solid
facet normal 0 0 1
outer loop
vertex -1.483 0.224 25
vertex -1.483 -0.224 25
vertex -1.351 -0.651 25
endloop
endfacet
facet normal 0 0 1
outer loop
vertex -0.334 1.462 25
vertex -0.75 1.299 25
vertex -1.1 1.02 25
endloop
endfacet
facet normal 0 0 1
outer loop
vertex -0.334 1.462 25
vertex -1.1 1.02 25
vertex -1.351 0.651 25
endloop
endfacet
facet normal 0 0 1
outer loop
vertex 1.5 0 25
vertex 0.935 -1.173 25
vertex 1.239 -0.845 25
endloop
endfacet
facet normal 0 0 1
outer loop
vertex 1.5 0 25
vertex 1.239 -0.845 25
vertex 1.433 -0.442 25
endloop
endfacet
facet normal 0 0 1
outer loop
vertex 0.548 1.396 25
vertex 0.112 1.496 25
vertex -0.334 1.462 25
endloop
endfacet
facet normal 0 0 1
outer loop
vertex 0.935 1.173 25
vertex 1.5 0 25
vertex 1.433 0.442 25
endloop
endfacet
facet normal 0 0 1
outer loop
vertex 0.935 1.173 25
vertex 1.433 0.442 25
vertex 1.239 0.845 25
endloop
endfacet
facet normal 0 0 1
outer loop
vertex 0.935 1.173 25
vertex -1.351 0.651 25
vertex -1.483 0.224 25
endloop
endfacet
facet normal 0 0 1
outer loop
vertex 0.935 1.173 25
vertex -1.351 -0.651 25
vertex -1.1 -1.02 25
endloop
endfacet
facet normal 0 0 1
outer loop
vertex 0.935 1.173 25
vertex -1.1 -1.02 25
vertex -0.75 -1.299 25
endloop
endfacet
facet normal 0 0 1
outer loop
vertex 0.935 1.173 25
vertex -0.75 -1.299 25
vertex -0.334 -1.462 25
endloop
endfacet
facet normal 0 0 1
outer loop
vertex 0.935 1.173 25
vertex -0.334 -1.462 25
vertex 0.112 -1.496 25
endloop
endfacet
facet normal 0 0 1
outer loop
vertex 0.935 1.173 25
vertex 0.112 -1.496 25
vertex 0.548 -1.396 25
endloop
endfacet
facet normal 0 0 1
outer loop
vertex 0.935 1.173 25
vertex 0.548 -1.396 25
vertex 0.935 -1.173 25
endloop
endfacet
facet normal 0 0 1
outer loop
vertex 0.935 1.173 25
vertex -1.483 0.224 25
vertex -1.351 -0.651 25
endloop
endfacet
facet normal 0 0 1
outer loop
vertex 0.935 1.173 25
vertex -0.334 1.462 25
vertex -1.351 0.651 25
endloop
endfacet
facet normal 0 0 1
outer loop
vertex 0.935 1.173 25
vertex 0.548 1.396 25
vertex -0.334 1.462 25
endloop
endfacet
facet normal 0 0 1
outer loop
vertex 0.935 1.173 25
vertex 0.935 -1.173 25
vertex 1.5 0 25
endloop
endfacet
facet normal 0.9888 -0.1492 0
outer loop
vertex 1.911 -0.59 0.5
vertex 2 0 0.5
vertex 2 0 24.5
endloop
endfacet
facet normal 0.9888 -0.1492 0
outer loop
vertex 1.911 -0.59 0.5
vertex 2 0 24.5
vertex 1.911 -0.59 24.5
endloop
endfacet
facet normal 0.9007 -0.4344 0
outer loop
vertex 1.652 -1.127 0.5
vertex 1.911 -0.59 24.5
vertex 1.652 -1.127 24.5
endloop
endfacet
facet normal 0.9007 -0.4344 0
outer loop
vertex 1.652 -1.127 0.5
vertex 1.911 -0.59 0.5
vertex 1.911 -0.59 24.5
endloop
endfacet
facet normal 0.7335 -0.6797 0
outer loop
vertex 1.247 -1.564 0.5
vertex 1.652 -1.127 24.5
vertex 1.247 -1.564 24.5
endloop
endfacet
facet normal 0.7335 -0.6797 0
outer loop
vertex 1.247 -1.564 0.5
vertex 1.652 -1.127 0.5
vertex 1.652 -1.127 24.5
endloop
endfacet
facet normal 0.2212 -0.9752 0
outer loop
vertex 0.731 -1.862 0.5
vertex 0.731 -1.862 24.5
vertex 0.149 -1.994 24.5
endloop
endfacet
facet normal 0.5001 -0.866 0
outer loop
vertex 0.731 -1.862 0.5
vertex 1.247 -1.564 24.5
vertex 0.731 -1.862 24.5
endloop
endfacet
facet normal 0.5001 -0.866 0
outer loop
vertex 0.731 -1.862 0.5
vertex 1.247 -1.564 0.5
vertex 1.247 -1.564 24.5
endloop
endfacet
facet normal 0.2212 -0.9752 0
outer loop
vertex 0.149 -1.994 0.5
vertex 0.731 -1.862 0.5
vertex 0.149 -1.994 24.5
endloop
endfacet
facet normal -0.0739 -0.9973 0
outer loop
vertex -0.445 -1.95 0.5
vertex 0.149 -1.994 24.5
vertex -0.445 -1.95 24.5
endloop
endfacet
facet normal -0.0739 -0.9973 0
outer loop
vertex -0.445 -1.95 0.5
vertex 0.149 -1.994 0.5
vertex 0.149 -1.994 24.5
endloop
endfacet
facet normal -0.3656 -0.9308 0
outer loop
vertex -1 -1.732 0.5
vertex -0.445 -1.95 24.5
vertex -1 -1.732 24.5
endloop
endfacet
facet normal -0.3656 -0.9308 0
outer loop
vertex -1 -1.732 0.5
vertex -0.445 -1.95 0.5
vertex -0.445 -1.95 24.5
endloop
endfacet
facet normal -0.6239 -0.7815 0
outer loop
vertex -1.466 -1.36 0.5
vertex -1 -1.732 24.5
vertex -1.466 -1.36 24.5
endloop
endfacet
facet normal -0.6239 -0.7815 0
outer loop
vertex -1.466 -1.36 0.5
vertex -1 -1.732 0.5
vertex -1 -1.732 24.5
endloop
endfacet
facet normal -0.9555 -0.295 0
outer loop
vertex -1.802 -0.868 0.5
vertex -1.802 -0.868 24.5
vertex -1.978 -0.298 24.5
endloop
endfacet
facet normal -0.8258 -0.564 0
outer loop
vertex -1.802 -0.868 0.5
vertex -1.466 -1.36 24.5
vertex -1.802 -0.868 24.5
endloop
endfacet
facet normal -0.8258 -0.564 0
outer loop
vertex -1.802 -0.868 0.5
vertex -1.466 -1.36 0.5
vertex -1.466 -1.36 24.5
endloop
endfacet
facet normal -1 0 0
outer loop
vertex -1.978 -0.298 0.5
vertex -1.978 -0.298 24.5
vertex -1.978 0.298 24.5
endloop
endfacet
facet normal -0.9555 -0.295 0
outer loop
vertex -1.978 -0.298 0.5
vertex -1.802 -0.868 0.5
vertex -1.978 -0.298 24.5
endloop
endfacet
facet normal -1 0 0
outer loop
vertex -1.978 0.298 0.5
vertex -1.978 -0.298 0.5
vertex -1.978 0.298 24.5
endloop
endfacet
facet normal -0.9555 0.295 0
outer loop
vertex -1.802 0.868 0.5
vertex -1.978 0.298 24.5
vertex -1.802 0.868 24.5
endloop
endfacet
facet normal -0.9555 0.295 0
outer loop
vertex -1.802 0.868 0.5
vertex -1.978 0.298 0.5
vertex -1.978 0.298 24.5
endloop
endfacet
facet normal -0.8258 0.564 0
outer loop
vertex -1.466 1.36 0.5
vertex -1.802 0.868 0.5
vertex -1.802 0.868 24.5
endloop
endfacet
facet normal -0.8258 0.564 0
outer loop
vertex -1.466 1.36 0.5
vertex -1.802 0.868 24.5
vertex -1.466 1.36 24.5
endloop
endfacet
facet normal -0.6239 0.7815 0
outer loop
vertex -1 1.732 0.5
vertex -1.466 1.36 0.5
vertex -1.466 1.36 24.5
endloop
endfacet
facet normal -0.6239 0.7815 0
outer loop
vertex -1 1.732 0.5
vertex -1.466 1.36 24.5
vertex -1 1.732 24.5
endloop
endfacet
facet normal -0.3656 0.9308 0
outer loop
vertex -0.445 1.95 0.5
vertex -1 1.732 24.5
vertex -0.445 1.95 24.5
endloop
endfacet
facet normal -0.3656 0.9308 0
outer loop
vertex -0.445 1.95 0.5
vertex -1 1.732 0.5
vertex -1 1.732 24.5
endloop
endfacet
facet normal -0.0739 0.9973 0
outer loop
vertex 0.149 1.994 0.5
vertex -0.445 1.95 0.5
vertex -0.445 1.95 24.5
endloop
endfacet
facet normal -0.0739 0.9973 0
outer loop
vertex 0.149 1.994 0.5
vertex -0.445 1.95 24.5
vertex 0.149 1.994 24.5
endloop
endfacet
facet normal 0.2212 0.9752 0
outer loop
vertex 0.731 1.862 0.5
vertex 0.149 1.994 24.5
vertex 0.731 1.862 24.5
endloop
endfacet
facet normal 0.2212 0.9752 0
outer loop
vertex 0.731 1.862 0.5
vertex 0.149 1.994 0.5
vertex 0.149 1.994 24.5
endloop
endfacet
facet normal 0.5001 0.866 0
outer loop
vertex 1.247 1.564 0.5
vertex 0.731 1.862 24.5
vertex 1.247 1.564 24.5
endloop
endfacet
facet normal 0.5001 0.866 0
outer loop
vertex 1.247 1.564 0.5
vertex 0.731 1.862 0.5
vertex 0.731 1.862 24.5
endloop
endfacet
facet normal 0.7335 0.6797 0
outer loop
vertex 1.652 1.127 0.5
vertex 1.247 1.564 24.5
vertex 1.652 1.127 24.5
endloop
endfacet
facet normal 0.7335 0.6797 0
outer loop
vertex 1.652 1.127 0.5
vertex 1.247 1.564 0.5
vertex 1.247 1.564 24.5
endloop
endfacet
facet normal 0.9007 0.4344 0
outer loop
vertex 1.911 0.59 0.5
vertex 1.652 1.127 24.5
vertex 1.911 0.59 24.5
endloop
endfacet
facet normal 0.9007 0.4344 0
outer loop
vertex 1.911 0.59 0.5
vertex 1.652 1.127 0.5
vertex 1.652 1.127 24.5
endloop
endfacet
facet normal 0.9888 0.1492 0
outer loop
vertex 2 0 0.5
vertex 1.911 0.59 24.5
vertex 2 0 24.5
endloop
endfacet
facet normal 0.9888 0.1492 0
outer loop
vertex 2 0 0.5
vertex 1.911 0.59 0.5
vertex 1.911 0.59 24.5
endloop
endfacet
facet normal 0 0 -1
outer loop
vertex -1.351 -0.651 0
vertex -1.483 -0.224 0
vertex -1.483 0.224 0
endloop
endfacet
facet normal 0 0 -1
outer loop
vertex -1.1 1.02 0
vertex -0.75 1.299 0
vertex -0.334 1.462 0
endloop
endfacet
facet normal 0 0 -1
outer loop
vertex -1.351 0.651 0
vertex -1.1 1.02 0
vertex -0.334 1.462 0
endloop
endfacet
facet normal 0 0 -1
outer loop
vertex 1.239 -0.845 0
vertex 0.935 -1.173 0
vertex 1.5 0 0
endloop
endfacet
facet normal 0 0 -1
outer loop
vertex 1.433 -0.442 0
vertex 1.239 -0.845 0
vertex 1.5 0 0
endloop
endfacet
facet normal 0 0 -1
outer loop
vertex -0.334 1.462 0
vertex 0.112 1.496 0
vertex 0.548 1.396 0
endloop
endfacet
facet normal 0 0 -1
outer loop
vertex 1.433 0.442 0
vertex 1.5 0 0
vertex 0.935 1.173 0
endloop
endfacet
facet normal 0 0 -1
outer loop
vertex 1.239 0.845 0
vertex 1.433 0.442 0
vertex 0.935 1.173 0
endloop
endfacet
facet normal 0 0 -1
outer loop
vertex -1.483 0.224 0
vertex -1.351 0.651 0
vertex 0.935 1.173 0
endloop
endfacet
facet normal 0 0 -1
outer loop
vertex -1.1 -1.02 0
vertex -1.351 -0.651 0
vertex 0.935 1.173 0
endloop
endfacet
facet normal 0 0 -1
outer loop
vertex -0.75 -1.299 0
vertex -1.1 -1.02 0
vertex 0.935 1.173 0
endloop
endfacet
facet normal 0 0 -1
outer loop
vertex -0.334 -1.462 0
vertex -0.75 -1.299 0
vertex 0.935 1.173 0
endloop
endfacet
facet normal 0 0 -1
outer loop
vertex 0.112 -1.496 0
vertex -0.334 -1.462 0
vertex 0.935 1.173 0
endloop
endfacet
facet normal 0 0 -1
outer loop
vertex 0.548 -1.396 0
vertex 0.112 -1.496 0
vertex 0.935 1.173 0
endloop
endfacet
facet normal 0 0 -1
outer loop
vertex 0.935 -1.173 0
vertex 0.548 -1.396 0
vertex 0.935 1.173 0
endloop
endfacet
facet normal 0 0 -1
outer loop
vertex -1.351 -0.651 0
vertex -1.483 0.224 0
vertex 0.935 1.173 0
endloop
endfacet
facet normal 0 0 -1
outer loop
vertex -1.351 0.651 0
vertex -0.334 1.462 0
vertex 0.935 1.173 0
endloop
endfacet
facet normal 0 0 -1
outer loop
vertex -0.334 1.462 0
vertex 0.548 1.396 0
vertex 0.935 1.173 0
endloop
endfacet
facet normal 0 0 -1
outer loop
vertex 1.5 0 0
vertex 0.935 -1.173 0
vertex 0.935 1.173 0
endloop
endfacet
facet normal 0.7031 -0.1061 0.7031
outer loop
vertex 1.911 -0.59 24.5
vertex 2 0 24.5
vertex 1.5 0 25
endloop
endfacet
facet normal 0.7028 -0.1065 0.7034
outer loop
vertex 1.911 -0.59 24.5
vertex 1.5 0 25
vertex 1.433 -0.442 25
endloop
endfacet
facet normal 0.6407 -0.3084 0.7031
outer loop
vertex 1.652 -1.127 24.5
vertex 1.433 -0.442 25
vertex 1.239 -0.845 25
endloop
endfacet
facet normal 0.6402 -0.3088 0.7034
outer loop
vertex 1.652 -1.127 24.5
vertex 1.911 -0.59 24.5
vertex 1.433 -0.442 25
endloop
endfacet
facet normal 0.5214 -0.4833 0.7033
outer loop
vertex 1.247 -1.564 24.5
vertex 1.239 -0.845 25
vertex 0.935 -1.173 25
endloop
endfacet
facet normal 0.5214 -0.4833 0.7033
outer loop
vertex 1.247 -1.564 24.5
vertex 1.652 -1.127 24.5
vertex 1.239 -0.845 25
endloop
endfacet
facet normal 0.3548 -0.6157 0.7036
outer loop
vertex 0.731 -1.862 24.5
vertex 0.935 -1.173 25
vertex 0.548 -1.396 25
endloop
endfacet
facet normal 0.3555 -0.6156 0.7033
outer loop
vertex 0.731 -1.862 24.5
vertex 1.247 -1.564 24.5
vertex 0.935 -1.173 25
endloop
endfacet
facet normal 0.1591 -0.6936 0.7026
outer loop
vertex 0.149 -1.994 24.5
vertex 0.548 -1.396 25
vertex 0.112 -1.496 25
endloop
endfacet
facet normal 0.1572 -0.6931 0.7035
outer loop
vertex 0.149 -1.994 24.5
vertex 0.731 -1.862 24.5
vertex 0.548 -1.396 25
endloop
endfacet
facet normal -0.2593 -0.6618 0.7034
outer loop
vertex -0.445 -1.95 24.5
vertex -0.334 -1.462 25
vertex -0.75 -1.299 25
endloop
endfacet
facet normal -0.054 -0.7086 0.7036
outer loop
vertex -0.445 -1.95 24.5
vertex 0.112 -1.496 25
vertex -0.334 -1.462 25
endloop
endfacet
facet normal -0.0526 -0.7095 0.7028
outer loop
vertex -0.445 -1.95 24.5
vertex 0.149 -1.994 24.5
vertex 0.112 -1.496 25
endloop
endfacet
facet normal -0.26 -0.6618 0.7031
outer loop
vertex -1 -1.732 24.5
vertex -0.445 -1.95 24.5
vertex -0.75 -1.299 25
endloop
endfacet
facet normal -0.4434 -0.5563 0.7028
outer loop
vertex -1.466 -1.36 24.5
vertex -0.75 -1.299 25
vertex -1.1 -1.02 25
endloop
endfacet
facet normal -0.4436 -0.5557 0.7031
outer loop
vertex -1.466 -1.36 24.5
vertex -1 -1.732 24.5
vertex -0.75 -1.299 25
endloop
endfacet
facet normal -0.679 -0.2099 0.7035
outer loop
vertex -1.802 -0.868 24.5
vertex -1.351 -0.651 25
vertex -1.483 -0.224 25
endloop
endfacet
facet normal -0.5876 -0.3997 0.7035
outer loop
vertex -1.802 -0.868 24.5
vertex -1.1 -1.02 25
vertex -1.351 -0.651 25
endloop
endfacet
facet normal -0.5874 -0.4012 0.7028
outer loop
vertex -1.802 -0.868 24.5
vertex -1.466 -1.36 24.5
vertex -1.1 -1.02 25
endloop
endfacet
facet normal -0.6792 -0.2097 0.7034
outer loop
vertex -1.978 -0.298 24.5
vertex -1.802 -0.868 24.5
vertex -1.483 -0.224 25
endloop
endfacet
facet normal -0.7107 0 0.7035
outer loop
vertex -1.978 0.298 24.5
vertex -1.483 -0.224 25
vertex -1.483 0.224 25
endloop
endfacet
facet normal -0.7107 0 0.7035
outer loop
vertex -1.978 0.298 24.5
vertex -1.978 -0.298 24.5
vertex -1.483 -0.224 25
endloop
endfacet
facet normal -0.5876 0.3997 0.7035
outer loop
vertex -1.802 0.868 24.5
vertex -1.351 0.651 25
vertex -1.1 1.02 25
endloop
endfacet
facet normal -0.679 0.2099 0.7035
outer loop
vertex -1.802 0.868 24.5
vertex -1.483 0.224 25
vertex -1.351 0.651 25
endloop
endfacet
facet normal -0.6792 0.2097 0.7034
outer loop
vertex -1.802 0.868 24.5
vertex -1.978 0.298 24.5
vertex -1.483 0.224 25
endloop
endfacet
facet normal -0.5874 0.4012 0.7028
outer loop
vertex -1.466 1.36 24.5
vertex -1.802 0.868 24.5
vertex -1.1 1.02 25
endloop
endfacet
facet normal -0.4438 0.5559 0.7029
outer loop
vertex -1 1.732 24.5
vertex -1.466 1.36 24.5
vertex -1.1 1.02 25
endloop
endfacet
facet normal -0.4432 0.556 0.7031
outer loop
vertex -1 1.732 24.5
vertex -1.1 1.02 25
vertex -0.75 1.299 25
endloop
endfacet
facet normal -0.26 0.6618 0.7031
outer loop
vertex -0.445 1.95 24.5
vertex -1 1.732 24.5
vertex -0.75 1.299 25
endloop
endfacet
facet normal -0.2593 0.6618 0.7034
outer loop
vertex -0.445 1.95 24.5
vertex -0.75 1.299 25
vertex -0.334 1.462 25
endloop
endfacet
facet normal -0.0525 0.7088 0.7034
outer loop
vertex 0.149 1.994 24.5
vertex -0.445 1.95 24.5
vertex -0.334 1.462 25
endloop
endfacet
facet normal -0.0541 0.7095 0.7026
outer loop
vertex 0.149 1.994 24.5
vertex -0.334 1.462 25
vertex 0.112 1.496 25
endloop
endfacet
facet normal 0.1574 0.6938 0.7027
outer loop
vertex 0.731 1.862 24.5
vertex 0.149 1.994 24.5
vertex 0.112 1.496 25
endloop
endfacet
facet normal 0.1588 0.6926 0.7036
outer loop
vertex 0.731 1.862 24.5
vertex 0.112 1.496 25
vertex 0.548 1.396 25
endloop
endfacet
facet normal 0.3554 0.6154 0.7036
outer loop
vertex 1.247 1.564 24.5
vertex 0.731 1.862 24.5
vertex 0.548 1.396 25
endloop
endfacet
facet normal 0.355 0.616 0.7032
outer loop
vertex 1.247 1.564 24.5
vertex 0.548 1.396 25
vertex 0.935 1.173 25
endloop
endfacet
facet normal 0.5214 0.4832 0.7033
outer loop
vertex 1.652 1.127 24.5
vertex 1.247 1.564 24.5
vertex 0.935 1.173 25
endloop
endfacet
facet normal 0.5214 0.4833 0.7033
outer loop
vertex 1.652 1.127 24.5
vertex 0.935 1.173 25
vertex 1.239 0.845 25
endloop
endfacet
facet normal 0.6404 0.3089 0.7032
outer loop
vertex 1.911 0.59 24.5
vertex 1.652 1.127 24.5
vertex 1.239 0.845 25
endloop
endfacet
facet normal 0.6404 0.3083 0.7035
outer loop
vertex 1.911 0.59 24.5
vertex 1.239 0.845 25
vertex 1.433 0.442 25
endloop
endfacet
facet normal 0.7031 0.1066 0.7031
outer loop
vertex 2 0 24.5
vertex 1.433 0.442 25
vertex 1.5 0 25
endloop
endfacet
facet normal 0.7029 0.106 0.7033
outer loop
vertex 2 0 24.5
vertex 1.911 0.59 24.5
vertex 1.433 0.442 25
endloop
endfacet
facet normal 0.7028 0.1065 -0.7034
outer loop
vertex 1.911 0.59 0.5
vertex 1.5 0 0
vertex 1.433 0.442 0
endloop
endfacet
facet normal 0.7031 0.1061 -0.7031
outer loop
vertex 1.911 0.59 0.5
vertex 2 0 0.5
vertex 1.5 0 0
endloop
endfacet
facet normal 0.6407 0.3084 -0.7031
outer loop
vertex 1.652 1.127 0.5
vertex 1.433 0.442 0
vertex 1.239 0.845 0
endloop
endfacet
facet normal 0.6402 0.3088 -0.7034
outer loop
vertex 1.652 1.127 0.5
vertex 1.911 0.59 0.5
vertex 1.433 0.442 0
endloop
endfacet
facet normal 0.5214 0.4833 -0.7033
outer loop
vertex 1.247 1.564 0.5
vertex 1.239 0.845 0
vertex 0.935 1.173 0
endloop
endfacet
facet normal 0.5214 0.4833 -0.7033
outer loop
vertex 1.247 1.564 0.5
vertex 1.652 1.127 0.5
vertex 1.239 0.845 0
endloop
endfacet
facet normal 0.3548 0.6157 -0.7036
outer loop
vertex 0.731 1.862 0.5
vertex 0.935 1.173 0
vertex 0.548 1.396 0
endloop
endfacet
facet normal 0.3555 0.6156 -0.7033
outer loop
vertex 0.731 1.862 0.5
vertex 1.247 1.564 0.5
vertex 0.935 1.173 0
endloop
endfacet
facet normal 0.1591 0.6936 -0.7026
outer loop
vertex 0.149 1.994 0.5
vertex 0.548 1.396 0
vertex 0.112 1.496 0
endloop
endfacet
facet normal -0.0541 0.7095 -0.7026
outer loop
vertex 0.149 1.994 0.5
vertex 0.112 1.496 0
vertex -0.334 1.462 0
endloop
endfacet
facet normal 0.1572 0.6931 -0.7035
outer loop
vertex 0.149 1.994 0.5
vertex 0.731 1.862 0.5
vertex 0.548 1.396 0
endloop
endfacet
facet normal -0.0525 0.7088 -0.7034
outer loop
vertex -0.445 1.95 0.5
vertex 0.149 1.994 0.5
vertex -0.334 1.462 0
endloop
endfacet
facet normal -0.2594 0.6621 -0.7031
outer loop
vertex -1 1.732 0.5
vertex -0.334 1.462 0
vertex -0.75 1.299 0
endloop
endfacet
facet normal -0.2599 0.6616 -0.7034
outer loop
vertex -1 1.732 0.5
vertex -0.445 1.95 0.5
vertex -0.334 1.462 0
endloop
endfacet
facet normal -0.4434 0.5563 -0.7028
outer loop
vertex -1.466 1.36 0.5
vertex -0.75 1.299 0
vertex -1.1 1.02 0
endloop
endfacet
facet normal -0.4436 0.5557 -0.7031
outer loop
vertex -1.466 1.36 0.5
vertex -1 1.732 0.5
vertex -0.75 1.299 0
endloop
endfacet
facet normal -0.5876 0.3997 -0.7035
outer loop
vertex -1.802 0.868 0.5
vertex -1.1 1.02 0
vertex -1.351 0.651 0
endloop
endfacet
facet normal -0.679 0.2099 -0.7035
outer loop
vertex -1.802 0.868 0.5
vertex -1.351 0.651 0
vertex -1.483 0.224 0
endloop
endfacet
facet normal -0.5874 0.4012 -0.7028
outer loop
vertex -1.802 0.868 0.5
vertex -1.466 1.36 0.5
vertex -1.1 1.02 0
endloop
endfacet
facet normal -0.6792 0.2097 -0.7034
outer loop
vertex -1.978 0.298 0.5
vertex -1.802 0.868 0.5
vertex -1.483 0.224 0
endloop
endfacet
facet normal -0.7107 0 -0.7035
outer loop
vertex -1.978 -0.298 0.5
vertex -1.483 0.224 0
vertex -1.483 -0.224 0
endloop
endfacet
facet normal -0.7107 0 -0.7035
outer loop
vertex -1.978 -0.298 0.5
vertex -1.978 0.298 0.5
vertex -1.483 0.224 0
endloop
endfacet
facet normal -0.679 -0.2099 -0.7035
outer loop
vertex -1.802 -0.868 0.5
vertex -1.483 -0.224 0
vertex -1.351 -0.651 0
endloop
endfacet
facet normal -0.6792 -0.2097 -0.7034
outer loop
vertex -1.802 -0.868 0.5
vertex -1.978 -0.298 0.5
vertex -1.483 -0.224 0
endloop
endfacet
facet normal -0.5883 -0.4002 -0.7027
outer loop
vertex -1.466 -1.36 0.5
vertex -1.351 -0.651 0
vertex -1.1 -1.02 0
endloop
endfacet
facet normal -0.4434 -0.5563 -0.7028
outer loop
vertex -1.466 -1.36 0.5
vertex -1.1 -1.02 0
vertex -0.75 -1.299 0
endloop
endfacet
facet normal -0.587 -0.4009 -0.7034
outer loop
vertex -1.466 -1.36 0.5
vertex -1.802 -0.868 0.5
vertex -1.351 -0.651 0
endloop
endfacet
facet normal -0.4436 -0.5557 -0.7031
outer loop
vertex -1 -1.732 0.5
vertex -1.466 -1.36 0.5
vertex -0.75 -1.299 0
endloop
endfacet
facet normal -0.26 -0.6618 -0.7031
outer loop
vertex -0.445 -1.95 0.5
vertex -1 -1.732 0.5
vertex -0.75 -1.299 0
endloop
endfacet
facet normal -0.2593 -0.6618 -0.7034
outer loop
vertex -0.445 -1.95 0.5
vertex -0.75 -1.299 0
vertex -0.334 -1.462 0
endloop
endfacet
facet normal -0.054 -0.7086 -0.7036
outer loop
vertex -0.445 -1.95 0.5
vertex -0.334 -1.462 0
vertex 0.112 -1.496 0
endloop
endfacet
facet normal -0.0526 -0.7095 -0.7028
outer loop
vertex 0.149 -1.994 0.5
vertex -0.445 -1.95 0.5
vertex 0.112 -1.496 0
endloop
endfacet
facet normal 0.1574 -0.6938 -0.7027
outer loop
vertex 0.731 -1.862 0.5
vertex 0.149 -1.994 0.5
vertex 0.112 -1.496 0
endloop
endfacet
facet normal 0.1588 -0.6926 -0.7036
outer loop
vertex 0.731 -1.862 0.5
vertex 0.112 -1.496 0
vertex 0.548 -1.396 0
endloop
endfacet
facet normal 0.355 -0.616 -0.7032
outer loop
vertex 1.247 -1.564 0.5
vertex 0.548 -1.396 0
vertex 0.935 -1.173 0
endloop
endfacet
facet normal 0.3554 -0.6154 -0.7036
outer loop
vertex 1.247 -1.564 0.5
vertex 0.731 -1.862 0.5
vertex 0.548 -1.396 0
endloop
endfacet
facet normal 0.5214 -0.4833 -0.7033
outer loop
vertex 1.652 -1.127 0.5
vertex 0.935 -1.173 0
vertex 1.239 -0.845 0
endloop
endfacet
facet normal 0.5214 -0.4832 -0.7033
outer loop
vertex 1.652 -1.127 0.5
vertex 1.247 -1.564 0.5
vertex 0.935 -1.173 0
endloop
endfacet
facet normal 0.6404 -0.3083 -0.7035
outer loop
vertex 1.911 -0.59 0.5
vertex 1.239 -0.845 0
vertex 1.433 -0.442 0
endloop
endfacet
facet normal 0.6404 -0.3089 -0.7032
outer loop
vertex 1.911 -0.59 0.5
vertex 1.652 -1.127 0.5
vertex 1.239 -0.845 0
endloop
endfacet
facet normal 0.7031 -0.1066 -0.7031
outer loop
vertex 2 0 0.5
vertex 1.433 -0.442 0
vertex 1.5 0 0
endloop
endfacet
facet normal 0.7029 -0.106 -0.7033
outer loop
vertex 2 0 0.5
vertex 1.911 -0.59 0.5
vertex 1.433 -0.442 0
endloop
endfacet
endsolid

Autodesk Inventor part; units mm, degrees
ref_plane "YZ Plane" through (0, 0, 0) normal (1, 0, 0) x (0, 1, 0)
ref_plane "XZ Plane" through (0, 0, 0) normal (0, 1, 0) x (-1, 0, 0)
ref_plane "XY Plane" through (0, 0, 0) normal (0, 0, 1) x (1, 0, 0)
sketch "Skizze1" plane through (0, 0, 0) normal (0, 0, 1) x (1, 0, 0)
  circle A0 centre (0, 0) radius 2
  dimension "Breite" = 4
extrude "Extrusion1" add sketch "Skizze1" along normal blind 25
chamfer "Fase1" distance 0.5 angle 45 1 edges at (-2, 0, 0)
chamfer "Fase2" distance 0.5 angle 45 1 edges at (-2, 0, 25) measured on face at (1.9741, -0.3208, 16.8333)
properties part number "Stift"
